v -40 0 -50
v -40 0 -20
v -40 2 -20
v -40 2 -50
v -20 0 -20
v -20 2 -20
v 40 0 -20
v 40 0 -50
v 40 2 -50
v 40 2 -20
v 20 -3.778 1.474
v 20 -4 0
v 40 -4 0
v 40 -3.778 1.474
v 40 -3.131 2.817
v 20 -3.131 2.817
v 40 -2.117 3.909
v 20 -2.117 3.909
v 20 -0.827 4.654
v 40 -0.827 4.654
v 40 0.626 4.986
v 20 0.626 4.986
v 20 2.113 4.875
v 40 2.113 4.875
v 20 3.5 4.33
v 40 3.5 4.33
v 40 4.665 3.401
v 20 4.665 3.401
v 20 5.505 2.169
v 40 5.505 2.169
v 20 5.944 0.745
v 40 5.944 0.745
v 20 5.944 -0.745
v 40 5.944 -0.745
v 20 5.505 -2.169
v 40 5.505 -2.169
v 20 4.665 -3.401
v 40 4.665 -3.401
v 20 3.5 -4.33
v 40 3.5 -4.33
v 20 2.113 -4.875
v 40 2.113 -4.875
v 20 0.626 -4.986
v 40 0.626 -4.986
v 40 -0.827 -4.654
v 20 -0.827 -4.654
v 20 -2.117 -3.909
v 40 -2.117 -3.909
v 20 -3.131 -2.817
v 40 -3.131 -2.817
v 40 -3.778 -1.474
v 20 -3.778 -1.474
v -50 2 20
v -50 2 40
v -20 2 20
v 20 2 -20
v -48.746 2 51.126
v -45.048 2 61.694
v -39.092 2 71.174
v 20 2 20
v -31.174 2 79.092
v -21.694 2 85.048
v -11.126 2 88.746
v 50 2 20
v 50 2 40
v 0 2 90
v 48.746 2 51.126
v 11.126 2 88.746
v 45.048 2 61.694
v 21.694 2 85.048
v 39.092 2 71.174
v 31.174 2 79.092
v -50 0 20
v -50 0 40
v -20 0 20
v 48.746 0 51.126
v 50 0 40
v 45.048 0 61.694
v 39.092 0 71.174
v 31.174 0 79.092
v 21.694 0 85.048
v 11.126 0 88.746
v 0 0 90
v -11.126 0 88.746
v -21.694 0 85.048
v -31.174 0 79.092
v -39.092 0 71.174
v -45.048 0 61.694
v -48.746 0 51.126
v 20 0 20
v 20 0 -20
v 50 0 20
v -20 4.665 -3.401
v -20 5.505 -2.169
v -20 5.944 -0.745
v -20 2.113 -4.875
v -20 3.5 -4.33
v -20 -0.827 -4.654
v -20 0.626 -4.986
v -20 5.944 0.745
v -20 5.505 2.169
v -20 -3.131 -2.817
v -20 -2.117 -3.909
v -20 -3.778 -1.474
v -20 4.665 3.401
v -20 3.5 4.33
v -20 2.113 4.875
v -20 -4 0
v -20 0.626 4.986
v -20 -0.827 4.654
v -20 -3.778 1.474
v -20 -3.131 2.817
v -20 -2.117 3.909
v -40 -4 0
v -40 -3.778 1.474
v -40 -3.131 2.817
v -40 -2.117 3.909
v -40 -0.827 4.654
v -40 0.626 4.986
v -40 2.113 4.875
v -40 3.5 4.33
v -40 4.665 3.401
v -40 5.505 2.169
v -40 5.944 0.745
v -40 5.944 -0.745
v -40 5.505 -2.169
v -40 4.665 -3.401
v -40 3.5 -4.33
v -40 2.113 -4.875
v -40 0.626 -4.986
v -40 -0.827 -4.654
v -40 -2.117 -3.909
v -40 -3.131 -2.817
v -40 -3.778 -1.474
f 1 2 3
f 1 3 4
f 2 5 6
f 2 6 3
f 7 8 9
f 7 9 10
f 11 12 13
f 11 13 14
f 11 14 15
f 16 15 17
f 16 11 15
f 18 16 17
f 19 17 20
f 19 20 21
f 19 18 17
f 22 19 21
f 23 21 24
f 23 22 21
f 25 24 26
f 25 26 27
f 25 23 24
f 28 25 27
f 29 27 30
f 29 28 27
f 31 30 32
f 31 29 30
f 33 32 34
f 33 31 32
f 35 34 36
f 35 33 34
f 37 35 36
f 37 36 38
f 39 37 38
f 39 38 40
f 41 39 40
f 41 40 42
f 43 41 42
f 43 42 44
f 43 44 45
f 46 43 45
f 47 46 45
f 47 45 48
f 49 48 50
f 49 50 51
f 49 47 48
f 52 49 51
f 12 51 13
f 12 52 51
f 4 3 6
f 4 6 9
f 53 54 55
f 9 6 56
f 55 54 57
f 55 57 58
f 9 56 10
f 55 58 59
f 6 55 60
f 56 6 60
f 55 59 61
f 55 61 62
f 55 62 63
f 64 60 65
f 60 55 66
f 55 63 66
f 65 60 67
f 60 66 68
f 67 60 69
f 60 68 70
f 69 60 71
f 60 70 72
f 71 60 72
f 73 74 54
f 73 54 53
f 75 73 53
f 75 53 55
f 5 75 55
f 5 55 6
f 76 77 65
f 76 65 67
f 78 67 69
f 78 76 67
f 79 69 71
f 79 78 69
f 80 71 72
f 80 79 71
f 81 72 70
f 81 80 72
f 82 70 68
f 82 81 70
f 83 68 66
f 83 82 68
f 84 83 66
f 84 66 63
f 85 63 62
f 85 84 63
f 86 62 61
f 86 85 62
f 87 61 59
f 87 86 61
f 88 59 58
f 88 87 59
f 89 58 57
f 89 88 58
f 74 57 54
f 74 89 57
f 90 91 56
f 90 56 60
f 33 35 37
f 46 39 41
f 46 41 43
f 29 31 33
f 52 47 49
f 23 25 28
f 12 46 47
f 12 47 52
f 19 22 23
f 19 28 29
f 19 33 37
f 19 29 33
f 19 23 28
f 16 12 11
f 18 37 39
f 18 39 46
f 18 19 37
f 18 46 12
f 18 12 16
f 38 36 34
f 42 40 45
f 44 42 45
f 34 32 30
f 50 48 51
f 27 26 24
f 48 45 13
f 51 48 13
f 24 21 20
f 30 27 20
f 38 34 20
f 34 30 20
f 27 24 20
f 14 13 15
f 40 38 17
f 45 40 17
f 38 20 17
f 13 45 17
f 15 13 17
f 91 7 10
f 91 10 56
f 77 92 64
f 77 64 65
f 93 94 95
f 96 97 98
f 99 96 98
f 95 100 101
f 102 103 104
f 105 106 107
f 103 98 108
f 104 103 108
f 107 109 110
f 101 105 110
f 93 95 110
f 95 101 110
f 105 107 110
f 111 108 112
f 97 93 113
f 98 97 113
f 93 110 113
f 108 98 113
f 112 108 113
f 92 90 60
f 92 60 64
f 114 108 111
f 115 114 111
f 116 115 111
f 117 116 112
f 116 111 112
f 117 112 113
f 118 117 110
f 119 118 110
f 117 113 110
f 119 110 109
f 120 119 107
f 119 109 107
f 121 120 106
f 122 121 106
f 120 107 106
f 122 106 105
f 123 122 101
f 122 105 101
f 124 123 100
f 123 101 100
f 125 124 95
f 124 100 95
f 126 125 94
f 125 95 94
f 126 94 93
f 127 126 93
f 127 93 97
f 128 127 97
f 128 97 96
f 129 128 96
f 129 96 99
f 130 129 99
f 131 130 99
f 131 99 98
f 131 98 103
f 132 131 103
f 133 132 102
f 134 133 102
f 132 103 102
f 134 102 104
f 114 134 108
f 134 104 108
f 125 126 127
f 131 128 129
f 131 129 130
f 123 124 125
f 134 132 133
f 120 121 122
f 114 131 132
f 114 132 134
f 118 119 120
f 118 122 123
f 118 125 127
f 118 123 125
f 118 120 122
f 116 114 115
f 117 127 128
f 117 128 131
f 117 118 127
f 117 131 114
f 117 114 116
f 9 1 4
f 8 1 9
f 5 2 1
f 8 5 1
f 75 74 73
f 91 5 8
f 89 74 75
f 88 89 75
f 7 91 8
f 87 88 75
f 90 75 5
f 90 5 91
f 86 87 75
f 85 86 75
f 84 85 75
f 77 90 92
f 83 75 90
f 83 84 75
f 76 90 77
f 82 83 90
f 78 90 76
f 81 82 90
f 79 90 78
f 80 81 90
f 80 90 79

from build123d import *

# Parameters (mm, degrees)
F1_DEPTH = 2
F2_R     = 5
F3_DEPTH = 20


with BuildPart() as f1:
    # F0 (on Front) → F1 (new body)
    with BuildSketch(Plane.XZ):
        with BuildLine():
            Line((-40, -50), (0, -50))
            Line((0, -50), (40, -50))
            Line((40, -50), (40, -20))
            Line((40, -20), (20, -20))
            Line((20, -20), (20, 20))
            Line((20, 20), (50, 20))
            Line((50, 20), (50, 40))
            ThreePointArc((50, 40), (35.355339, 75.355339), (0, 90))
            ThreePointArc((0, 90), (-35.355339, 75.355339), (-50, 40))
            Line((-50, 40), (-50, 20))
            Line((-50, 20), (-20, 20))
            Line((-20, 20), (-20, -20))
            Line((-20, -20), (-40, -20))
            Line((-40, -20), (-40, -50))
        make_face()
    extrude(amount=-F1_DEPTH)


with BuildPart() as f3:
    # F2 (on face) → F3 (new body)
    with BuildSketch(Plane(origin=(-20, 0, 0), x_dir=(0, -1, 0), z_dir=(-1, 0, 0))):
        with Locations((-1, 0)):
            Circle(F2_R)
    extrude(amount=F3_DEPTH)


with BuildPart() as f4_1:
    # F4: instance of F3
    add(f3.part.mirror(Plane.YZ))


solid = Compound([f1.part, f3.part, f4_1.part])
